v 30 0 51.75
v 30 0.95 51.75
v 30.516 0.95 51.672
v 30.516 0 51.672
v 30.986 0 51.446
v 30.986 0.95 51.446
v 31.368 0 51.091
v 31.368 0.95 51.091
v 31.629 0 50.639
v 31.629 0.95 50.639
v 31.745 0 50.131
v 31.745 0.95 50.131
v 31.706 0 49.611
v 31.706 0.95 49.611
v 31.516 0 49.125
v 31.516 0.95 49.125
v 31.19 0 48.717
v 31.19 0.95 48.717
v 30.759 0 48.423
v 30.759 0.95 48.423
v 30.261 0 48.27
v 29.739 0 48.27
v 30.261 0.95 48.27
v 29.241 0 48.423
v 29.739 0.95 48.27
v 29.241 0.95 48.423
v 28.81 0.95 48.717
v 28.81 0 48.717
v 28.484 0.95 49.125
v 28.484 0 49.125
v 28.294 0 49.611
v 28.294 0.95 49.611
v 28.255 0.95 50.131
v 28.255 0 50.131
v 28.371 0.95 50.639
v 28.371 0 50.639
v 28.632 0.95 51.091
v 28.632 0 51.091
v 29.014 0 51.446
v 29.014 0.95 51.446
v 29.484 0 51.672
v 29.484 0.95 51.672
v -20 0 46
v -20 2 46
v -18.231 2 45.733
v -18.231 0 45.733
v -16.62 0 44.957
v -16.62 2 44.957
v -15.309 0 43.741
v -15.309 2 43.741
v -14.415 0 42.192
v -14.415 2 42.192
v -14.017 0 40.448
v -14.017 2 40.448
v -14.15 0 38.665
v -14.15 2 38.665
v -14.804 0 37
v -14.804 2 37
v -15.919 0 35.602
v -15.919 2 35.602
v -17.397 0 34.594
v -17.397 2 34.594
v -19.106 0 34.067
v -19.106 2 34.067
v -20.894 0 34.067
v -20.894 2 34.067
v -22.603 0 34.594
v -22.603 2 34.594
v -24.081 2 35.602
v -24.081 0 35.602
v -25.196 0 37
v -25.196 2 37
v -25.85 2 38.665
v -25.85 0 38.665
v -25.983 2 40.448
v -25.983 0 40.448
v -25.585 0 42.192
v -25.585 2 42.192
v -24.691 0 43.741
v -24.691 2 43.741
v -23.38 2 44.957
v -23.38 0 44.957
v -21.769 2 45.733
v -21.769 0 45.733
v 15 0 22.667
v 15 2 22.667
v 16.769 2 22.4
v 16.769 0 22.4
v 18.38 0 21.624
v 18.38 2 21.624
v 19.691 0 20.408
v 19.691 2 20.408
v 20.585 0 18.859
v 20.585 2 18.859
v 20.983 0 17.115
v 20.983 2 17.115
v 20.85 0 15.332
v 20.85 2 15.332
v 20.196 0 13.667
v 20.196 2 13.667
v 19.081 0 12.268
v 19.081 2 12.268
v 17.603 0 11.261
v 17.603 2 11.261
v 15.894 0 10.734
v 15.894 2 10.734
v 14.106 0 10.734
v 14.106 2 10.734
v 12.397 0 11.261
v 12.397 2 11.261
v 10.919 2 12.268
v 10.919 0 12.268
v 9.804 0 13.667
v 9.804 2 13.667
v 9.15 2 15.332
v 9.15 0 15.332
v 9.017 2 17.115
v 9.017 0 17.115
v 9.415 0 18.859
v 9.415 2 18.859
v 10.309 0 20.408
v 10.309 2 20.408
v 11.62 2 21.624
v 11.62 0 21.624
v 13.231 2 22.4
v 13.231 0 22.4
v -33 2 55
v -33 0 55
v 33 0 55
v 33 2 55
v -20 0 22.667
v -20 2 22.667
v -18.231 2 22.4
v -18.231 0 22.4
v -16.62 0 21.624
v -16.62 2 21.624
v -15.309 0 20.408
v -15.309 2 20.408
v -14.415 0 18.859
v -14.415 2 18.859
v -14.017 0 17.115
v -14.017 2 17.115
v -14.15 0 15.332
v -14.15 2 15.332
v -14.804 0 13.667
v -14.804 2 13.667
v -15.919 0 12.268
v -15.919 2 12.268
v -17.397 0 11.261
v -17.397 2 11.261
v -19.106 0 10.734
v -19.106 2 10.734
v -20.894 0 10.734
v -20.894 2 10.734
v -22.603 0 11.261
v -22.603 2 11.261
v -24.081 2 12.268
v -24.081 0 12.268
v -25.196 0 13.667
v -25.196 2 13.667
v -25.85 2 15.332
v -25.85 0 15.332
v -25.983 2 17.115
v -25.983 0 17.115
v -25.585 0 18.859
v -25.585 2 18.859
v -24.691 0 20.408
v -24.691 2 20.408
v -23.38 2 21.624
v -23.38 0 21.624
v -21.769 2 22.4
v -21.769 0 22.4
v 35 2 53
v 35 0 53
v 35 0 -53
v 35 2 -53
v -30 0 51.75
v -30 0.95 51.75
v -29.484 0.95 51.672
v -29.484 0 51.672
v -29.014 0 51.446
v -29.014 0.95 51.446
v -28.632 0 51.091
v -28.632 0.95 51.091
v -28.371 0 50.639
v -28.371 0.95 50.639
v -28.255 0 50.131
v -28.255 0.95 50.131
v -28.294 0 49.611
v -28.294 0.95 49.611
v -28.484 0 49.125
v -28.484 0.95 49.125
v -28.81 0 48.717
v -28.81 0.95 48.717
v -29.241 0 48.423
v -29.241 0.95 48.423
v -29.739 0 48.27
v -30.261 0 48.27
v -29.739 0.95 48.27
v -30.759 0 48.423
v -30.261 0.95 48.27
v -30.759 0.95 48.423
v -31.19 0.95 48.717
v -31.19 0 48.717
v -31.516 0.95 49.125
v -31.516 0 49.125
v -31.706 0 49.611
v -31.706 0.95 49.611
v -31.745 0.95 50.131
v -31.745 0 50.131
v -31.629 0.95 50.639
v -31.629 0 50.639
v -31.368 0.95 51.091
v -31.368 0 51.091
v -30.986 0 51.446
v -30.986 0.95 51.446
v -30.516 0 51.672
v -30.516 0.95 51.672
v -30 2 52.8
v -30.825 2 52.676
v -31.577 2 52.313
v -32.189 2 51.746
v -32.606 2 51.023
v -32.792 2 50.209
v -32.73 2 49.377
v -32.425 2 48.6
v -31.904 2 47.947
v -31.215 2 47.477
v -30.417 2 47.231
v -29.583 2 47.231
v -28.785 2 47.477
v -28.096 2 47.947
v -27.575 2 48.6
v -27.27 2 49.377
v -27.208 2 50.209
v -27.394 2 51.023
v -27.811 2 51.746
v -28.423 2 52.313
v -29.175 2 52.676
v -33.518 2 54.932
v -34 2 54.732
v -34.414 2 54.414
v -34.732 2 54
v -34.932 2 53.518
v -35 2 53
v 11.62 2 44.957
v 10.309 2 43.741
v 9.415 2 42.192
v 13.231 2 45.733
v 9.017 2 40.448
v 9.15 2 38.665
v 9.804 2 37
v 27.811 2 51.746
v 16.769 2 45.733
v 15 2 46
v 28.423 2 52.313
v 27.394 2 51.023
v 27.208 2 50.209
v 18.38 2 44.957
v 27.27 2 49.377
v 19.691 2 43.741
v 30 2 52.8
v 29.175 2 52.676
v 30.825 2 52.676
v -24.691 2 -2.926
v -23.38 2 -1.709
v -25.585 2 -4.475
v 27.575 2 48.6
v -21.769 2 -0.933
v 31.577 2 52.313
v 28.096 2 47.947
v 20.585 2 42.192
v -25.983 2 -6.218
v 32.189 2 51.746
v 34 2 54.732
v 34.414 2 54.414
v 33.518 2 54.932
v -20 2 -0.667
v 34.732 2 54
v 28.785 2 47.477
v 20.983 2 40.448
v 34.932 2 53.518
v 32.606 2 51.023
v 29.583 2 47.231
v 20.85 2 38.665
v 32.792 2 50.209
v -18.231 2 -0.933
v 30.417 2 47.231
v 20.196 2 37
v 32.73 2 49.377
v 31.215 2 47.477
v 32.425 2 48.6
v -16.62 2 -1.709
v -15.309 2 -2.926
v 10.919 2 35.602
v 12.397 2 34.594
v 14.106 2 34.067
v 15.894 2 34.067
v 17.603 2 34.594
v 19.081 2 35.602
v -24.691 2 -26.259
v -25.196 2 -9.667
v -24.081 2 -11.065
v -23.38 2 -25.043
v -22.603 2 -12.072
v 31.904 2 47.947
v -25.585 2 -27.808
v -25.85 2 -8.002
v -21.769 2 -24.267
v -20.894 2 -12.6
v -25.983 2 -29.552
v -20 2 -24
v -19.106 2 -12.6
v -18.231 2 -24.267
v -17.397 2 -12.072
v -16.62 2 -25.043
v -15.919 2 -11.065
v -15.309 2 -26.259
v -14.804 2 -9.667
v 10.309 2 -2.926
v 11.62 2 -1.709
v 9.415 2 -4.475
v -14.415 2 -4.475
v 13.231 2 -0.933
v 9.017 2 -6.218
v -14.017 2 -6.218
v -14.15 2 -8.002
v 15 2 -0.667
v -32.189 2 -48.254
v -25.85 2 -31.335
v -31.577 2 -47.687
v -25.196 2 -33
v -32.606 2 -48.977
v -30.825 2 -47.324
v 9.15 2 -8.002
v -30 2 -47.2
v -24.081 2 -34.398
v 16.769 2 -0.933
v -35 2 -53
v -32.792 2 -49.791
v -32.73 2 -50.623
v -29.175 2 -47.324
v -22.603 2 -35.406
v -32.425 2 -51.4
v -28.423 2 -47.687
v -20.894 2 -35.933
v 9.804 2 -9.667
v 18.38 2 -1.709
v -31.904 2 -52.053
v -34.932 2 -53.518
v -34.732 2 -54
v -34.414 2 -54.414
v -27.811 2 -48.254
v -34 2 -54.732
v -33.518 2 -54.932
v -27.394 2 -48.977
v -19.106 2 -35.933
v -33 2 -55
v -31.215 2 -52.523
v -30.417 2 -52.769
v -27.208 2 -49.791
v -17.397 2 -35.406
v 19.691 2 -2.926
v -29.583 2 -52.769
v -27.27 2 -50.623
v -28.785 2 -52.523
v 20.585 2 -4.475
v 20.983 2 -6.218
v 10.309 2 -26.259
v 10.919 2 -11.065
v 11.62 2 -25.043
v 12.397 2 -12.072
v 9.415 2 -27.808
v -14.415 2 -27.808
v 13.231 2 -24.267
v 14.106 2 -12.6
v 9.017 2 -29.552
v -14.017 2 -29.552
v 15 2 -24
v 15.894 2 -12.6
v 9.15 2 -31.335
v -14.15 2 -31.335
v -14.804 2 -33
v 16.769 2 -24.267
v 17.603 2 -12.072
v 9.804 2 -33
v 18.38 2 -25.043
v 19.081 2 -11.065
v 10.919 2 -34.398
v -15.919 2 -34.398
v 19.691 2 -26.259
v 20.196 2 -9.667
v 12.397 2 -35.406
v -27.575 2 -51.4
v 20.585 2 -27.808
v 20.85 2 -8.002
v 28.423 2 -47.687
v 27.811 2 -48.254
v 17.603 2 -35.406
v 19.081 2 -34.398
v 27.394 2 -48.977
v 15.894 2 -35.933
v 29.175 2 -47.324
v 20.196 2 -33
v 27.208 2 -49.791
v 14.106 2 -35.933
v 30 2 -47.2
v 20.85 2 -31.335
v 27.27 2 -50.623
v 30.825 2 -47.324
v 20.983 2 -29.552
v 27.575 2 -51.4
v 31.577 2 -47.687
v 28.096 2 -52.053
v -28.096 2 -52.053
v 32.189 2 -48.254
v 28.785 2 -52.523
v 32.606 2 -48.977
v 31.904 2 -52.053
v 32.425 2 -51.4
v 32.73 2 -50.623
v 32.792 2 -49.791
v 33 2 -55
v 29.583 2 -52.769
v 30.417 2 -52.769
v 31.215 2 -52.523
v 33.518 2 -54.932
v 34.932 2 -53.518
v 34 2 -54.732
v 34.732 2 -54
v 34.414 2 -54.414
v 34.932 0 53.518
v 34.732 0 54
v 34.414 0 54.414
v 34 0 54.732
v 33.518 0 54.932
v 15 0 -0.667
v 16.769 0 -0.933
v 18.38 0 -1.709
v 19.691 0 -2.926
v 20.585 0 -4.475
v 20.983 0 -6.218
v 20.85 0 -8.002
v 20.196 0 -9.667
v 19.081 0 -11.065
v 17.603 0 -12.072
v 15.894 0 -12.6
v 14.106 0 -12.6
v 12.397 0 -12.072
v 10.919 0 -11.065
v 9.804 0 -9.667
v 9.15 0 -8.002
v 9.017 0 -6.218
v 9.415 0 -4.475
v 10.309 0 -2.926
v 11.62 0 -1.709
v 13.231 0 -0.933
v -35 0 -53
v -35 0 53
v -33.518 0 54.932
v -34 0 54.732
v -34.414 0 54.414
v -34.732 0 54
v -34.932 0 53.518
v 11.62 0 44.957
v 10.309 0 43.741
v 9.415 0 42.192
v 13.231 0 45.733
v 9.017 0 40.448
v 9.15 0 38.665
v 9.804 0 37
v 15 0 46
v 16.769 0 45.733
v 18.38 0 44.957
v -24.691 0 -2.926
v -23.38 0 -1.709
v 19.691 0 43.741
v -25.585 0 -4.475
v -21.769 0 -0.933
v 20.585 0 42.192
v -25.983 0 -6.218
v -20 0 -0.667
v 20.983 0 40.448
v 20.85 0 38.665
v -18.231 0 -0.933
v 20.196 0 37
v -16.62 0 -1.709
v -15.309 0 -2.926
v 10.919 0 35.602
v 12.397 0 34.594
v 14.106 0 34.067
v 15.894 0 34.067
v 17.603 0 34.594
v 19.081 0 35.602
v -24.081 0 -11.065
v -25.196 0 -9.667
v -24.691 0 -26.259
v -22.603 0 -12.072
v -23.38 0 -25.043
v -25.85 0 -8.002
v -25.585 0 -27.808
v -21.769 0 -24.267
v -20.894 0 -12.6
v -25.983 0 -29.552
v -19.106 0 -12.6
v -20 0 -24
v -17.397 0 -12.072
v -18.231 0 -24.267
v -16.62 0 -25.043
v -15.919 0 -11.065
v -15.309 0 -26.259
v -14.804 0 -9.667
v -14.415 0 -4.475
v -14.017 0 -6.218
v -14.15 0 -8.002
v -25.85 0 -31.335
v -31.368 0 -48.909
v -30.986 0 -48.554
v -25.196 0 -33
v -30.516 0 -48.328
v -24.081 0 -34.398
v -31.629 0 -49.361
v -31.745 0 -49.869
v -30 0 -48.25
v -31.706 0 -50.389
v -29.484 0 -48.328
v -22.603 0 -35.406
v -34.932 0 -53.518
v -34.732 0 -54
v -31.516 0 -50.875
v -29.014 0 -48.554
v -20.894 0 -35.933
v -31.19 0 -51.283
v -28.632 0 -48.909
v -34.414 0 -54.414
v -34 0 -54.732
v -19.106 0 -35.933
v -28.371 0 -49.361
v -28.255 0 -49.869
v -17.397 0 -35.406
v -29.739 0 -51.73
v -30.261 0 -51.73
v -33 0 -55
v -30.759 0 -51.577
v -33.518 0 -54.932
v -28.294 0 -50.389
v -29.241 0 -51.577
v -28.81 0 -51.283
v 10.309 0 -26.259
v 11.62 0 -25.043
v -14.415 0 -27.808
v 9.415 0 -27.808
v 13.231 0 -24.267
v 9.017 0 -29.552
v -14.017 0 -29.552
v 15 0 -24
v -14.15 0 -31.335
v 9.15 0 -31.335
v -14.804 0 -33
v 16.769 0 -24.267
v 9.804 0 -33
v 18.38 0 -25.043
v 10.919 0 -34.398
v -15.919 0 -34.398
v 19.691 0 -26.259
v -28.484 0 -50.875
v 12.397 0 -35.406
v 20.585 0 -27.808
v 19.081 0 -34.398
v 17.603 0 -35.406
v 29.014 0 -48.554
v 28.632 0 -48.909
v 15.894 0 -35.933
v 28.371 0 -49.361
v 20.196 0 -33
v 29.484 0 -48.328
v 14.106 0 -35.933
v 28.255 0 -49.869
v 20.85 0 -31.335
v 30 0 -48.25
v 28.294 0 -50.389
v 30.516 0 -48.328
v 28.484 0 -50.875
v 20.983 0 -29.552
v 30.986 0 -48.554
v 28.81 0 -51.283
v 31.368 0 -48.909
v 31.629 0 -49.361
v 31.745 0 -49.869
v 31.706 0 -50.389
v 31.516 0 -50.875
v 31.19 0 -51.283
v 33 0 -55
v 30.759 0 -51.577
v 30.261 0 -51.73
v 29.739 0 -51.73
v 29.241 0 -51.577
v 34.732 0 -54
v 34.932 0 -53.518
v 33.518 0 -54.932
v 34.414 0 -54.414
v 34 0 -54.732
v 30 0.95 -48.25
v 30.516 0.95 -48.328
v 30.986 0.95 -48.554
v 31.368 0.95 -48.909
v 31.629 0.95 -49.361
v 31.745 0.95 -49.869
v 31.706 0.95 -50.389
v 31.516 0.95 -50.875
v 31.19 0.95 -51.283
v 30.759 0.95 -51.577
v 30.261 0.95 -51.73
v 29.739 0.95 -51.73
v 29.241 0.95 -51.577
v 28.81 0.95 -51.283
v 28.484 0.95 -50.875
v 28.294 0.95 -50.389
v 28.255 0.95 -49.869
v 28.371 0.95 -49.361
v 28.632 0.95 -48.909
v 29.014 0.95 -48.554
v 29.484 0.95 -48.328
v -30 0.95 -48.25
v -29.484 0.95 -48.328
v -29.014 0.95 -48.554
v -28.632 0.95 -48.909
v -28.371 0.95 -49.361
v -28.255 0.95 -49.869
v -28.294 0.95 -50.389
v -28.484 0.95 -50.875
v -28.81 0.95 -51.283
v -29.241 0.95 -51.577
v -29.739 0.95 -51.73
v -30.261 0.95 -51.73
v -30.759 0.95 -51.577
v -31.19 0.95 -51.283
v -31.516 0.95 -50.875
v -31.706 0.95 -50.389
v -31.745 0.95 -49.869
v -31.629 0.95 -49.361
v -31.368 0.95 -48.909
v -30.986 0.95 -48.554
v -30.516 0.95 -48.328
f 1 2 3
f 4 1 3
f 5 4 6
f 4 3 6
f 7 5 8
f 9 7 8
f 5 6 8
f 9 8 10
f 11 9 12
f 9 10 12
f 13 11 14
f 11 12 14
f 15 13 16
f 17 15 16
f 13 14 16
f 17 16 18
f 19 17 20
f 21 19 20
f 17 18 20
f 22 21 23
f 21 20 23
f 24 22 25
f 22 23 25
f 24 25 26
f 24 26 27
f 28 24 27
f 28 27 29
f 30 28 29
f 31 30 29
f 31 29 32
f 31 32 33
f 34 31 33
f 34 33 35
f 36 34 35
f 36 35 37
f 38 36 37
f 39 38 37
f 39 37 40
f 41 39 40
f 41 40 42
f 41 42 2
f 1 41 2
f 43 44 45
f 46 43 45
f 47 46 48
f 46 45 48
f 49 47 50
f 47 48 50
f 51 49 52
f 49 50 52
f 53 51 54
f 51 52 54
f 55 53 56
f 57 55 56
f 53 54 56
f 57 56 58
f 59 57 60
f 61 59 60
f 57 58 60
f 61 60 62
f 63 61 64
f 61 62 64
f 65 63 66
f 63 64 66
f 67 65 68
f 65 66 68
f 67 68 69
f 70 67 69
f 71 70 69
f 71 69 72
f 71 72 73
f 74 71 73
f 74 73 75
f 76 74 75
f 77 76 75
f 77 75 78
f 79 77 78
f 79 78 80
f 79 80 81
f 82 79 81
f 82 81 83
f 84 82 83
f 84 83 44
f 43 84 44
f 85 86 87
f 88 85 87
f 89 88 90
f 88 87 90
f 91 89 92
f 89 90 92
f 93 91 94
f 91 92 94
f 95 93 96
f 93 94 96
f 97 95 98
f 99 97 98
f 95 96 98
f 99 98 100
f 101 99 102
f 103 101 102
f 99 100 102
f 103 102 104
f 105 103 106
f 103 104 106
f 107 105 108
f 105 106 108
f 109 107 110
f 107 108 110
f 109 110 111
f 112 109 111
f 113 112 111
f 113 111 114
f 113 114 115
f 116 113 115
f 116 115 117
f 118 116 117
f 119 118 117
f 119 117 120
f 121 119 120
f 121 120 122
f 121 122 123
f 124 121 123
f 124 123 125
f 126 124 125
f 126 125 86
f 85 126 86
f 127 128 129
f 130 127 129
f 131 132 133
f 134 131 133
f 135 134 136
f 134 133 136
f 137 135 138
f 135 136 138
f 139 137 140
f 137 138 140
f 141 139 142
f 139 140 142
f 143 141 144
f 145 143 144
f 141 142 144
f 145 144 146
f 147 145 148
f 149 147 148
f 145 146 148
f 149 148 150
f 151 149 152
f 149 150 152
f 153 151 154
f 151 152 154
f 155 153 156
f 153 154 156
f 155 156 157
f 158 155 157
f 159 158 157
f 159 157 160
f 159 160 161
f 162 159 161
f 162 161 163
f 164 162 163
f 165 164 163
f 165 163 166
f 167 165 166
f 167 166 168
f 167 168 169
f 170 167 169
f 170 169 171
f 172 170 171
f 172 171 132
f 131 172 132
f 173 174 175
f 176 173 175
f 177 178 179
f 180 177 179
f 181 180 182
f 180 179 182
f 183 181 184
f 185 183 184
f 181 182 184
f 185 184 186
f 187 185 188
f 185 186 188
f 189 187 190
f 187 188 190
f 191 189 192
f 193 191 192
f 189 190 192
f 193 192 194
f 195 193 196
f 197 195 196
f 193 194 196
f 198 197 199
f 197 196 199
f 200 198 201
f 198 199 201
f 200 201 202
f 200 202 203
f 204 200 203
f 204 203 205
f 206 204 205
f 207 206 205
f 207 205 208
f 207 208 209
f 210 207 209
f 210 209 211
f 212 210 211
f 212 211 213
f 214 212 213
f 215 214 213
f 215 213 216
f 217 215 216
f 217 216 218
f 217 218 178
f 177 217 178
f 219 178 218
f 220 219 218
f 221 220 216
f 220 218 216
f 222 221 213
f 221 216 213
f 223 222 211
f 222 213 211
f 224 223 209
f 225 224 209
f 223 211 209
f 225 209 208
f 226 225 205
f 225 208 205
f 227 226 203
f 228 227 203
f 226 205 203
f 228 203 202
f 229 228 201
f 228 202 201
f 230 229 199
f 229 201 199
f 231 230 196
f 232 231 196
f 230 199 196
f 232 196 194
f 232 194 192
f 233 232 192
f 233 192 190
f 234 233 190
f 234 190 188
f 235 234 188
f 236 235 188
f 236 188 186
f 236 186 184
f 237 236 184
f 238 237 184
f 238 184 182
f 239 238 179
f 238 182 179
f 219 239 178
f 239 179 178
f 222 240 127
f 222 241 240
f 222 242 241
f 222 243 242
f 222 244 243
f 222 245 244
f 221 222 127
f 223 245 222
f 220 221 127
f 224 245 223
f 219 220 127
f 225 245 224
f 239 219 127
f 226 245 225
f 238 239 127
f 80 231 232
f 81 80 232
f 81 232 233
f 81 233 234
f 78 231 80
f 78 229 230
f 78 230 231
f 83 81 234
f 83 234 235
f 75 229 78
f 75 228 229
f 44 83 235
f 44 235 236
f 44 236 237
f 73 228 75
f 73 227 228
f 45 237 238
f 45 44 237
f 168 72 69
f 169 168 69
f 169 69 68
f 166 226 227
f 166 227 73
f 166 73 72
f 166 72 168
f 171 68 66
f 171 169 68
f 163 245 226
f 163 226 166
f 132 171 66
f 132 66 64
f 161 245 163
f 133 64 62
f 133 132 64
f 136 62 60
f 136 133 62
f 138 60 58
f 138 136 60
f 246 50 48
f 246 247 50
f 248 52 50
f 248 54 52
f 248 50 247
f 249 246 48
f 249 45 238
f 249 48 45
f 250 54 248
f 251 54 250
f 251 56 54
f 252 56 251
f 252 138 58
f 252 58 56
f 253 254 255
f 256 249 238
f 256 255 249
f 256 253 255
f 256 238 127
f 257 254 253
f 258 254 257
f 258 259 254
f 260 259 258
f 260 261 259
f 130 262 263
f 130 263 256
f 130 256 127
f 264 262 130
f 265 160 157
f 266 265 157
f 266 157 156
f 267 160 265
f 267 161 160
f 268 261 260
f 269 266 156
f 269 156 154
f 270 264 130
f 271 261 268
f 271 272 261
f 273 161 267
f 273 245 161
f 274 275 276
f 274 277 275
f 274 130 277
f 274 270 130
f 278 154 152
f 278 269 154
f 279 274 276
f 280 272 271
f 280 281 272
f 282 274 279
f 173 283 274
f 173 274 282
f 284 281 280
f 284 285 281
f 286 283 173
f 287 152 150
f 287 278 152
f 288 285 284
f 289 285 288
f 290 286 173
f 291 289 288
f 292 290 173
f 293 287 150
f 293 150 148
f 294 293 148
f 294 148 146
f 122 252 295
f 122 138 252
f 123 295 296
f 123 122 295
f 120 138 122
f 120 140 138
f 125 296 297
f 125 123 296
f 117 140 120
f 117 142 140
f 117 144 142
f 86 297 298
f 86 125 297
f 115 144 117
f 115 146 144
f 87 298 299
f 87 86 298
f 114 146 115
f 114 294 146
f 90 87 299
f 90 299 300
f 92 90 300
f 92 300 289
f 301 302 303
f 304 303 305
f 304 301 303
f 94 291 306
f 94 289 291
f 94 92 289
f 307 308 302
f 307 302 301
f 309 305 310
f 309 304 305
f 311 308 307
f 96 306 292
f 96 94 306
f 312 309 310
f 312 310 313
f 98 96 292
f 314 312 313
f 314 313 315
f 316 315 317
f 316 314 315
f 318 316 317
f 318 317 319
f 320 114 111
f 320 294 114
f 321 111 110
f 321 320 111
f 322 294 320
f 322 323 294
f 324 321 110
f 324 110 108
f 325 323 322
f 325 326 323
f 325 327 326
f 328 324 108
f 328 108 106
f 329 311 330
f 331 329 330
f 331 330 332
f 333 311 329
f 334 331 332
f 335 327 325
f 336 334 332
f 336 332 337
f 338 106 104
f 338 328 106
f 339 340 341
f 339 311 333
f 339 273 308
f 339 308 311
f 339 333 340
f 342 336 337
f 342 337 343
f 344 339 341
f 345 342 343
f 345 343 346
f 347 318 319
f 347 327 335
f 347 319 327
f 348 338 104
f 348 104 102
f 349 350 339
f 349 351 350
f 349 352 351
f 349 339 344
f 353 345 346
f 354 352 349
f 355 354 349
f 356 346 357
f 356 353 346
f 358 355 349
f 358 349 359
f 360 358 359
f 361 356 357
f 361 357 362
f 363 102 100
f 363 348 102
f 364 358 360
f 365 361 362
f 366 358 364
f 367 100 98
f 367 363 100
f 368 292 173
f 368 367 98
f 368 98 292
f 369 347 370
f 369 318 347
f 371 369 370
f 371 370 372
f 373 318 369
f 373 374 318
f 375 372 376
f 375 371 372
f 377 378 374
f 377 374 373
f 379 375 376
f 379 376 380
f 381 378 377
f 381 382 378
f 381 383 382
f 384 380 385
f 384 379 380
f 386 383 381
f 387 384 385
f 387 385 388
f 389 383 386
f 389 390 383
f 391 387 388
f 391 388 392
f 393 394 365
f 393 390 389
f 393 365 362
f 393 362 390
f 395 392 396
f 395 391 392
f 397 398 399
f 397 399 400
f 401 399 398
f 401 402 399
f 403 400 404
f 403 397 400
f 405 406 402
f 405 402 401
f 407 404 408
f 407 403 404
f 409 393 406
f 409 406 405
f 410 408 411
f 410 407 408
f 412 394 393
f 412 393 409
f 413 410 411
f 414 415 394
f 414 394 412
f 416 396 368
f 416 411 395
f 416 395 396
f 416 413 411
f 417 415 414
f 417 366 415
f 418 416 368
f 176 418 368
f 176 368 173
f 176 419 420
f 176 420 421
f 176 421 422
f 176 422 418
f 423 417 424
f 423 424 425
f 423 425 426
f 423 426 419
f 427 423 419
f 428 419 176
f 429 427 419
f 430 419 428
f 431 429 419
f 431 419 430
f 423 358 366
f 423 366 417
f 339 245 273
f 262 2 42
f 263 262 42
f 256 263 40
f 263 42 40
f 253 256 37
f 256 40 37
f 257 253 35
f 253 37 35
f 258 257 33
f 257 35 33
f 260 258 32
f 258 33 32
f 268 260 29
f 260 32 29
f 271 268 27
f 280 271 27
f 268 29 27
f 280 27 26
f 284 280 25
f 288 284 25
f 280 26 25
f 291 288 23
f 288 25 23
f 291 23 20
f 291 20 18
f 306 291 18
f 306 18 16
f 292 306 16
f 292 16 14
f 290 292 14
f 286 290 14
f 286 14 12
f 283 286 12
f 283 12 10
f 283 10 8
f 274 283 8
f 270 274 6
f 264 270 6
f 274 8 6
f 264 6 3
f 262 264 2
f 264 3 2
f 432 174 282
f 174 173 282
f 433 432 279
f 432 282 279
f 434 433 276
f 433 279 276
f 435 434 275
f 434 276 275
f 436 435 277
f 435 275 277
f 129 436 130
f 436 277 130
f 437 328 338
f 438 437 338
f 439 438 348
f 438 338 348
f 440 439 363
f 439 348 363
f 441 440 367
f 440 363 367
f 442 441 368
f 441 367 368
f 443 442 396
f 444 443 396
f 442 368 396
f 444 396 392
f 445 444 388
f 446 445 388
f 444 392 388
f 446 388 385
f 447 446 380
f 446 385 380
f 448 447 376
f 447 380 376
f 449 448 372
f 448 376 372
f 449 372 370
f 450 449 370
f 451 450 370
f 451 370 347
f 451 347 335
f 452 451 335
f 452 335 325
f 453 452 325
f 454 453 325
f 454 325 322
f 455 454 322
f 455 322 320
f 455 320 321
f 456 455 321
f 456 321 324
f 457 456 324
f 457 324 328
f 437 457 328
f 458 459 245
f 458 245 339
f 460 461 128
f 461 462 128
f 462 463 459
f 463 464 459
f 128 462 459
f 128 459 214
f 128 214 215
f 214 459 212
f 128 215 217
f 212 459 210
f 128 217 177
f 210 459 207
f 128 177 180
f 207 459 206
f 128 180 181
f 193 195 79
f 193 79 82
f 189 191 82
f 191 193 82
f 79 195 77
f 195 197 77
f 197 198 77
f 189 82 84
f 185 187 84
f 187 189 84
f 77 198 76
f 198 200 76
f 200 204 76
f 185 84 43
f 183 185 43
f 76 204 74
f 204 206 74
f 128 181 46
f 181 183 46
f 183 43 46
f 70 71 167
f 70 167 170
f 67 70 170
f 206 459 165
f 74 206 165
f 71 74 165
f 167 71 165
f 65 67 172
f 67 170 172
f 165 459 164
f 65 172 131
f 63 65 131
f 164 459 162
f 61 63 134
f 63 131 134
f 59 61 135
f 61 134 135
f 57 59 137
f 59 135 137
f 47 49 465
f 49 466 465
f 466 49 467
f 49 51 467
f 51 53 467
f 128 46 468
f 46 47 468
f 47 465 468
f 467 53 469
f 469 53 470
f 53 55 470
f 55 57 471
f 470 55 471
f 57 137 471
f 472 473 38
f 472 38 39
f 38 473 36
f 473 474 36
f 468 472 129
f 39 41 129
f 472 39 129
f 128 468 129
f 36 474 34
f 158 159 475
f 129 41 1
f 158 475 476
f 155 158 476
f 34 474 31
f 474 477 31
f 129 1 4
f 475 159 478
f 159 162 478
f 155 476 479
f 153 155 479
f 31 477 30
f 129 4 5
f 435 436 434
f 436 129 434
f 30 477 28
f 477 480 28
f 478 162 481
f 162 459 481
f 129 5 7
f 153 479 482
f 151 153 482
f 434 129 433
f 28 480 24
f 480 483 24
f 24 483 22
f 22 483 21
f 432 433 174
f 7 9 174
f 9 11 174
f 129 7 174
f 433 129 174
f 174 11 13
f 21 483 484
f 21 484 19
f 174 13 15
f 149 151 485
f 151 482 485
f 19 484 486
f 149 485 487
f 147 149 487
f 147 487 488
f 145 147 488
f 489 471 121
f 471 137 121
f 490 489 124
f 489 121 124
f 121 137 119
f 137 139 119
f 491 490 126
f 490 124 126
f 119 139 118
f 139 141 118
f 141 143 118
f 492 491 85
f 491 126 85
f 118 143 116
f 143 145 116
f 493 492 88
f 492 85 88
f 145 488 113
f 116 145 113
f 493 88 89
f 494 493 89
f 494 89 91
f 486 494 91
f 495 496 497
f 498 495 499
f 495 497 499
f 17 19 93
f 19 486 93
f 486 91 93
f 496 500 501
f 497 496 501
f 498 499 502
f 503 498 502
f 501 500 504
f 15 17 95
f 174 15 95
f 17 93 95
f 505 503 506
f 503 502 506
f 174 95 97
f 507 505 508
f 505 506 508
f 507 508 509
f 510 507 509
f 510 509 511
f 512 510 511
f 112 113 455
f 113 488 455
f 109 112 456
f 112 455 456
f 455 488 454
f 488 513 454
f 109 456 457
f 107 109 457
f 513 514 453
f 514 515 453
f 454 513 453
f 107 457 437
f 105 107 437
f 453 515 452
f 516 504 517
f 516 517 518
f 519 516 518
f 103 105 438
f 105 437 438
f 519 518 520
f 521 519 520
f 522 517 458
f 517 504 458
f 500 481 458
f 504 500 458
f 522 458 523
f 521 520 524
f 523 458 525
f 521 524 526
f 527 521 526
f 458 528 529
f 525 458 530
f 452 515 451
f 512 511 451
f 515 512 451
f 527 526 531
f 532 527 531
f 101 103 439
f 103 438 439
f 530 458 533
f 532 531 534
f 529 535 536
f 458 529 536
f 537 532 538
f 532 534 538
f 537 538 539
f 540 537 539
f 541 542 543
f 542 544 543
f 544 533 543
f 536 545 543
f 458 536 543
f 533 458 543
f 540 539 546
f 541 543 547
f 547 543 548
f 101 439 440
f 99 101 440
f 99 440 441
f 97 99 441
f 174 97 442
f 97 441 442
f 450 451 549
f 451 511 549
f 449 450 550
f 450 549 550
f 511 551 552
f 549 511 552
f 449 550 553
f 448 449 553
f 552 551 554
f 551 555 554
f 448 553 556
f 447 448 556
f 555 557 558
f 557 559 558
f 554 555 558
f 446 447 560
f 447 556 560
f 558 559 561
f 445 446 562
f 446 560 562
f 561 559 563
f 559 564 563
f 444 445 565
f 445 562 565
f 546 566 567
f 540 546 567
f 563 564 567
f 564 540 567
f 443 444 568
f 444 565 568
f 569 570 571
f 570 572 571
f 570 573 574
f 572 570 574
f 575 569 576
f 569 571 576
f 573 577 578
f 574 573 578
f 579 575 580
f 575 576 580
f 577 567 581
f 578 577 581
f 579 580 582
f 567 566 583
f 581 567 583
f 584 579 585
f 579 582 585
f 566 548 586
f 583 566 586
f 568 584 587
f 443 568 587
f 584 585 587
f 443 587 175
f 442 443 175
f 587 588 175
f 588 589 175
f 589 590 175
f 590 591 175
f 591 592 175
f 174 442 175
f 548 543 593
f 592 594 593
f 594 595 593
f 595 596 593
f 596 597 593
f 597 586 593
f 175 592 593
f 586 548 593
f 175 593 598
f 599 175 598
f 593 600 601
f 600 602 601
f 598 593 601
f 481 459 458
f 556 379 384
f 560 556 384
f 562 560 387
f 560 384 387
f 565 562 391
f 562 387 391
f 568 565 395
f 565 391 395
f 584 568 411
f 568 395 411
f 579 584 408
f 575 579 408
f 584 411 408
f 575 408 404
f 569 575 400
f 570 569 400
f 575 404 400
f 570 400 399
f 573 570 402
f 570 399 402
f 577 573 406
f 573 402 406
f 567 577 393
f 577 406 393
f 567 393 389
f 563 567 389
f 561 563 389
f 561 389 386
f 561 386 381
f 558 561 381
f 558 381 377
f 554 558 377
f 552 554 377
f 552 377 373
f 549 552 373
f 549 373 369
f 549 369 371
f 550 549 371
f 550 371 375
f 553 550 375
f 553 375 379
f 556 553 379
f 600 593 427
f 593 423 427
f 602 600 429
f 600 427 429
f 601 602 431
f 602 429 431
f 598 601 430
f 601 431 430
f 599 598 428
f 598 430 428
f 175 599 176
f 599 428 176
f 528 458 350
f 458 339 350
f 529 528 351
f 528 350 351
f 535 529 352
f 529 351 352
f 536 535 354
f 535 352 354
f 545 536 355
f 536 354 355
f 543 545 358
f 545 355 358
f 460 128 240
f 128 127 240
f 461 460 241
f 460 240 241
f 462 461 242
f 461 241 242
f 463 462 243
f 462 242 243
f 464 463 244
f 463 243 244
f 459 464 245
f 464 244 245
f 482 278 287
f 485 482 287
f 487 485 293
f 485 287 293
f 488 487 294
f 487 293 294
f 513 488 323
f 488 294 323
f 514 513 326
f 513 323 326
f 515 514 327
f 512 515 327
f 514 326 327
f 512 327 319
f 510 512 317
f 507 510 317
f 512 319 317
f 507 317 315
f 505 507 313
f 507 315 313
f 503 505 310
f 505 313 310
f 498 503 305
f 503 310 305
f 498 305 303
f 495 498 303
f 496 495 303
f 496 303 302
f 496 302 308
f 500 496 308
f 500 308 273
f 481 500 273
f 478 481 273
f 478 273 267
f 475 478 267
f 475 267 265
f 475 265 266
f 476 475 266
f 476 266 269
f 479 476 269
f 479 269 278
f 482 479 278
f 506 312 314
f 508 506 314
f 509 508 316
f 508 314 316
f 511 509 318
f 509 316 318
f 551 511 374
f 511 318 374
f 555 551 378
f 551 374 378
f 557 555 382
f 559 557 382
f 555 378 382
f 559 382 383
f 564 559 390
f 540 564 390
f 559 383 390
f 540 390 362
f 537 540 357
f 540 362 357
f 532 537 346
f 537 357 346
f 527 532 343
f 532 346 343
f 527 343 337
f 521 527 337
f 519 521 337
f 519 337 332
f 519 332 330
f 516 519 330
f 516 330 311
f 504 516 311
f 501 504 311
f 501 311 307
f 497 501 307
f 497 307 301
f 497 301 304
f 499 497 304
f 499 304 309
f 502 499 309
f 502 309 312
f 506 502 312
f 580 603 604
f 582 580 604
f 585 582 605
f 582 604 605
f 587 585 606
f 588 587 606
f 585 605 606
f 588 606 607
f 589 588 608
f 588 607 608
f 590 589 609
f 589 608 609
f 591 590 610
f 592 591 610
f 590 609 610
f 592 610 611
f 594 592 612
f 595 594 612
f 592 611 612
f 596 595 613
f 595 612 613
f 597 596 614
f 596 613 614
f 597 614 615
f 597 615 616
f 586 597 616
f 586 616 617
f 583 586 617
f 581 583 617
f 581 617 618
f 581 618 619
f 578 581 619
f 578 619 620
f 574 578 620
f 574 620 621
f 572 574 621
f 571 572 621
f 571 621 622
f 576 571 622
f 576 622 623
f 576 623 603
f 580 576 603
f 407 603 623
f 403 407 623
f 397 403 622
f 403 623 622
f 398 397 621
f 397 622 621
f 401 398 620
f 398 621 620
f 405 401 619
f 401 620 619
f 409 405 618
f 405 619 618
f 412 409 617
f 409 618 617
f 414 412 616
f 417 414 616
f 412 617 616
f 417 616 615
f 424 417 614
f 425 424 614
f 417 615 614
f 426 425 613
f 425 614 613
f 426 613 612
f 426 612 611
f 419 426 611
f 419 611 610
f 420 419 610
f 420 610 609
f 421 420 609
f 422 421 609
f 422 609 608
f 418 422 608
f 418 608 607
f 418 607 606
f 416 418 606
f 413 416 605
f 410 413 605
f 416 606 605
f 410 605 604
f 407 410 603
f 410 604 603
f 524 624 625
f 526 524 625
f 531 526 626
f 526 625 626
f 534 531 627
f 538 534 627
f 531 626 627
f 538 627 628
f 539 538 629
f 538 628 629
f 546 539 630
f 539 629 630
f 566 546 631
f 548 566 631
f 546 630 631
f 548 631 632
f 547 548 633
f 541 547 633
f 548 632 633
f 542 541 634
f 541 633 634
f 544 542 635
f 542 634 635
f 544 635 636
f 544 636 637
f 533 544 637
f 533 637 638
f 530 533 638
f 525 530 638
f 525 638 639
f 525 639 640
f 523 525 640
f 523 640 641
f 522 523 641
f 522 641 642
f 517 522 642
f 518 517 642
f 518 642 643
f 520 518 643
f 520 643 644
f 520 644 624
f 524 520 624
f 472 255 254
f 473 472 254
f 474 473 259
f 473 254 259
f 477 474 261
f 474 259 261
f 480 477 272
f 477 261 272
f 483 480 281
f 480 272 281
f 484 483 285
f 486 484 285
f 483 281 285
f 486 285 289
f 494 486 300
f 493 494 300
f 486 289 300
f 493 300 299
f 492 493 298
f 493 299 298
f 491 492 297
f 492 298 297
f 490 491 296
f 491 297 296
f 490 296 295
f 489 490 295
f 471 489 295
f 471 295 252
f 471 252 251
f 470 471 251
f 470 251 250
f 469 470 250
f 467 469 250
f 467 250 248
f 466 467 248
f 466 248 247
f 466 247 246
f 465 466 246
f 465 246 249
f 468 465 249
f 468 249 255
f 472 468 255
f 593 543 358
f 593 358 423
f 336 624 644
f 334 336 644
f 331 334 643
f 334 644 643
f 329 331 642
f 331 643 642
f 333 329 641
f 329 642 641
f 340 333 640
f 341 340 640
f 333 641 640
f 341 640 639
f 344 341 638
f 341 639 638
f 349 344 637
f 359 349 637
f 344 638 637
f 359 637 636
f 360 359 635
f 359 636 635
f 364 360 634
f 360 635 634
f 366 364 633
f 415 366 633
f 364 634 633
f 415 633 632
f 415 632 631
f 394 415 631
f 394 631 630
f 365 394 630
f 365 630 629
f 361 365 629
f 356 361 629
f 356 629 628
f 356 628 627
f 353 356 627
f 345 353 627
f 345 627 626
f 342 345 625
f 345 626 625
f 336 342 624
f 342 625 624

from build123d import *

# Parameters (mm, degrees)
FACE_PLATE_W           = 70
FACE_PLATE_H           = 110
FACE_PLATE_EXT_DEPTH   = 2
BUTTONS_R              = 6
BUTTONS_CUT_DEPTH      = 10
M3_TOP_SCREW_R         = 1.75
M3_TOP_SCREW_CUT_DEPTH = 10
FILLET1_R              = 2
FILLET2_R              = 2
FILLET3_R              = 2
FILLET4_R              = 2


with BuildPart() as part:
    # Face Plate → Face Plate Ext (new body)
    with BuildSketch(Plane(origin=(0, 0, 0), x_dir=(1, 0, 0), z_dir=(0, 1, 0))):
        Rectangle(FACE_PLATE_W, FACE_PLATE_H)
    extrude(amount=FACE_PLATE_EXT_DEPTH)

    # Buttons → Buttons CUT (cut)
    with BuildSketch(Plane(origin=(0, 2, 0), x_dir=(1, 0, 0), z_dir=(0, 1, 0))):
        with Locations(Location((-20, 30, 0), (0, 0, 270))):
            Circle(BUTTONS_R)
        with Locations(Location((15, 30, 0), (0, 0, 270))):
            Circle(BUTTONS_R)
        with Locations(Location((-20, 6.666666667, 0), (0, 0, 270))):
            Circle(BUTTONS_R)
        with Locations(Location((15, 6.666666667, 0), (0, 0, 270))):
            Circle(BUTTONS_R)
        with Locations(Location((-20, -16.666666667, 0), (0, 0, 270))):
            Circle(BUTTONS_R)
        with Locations(Location((-20, -40, 0), (0, 0, 270))):
            Circle(BUTTONS_R)
        with Locations(Location((15, -16.666666667, 0), (0, 0, 270))):
            Circle(BUTTONS_R)
        with Locations(Location((15, -40, 0), (0, 0, 270))):
            Circle(BUTTONS_R)
    extrude(amount=-BUTTONS_CUT_DEPTH, mode=Mode.SUBTRACT)

    # M3 Top Screw → M3 Top Screw CUT (cut)
    with BuildSketch(Plane(origin=(0, 2, 0), x_dir=(1, 0, 0), z_dir=(0, 1, 0))):
        with Locations(Location((-30, 50, 0), (0, 0, 270))):
            Circle(M3_TOP_SCREW_R)
        with Locations(Location((30, 50, 0), (0, 0, 270))):
            Circle(M3_TOP_SCREW_R)
        with Locations(Location((-30, -50, 0), (0, 0, 270))):
            Circle(M3_TOP_SCREW_R)
        with Locations(Location((30, -50, 0), (0, 0, 270))):
            Circle(M3_TOP_SCREW_R)
    extrude(amount=-M3_TOP_SCREW_CUT_DEPTH, mode=Mode.SUBTRACT)

    # M3 Head Top CUT cone 1 section (through the dimple's axis) → M3 Head Top CUT (revolve, cut)
    with BuildSketch(Plane(origin=(-30, 2, -50), x_dir=(0, 0, 1), z_dir=(1, 0, 0))):
        Polygon((0, 0), (2.8, 0), (0, 2.8), align=None)
    revolve(axis=Axis((-30, 2, -50), (0, -1, 0)), mode=Mode.SUBTRACT)

    # M3 Head Top CUT cone 2 section (through the dimple's axis) → M3 Head Top CUT cone 2 (revolve, cut)
    with BuildSketch(Plane(origin=(30, 2, -50), x_dir=(0, 0, 1), z_dir=(1, 0, 0))):
        Polygon((0, 0), (2.8, 0), (0, 2.8), align=None)
    revolve(axis=Axis((30, 2, -50), (0, -1, 0)), mode=Mode.SUBTRACT)

    # M3 Head Top CUT cone 3 section (through the dimple's axis) → M3 Head Top CUT cone 3 (revolve, cut)
    with BuildSketch(Plane(origin=(30, 2, 50), x_dir=(0, 0, 1), z_dir=(1, 0, 0))):
        Polygon((0, 0), (2.8, 0), (0, 2.8), align=None)
    revolve(axis=Axis((30, 2, 50), (0, -1, 0)), mode=Mode.SUBTRACT)

    # M3 Head Top CUT cone 4 section (through the dimple's axis) → M3 Head Top CUT cone 4 (revolve, cut)
    with BuildSketch(Plane(origin=(-30, 2, 50), x_dir=(0, 0, 1), z_dir=(1, 0, 0))):
        Polygon((0, 0), (2.8, 0), (0, 2.8), align=None)
    revolve(axis=Axis((-30, 2, 50), (0, -1, 0)), mode=Mode.SUBTRACT)

    # Fillet1
    fillet1_edges = [part.edges().sort_by_distance(p)[0] for p in [
        (-35, 1, -55),
    ]]
    fillet(fillet1_edges, radius=FILLET1_R)

    # Fillet2
    fillet2_edges = [part.edges().sort_by_distance(p)[0] for p in [
        (35, 1, -55),
    ]]
    fillet(fillet2_edges, radius=FILLET2_R)

    # Fillet3
    fillet3_edges = [part.edges().sort_by_distance(p)[0] for p in [
        (35, 1, 55),
    ]]
    fillet(fillet3_edges, radius=FILLET3_R)

    # Fillet4
    fillet4_edges = [part.edges().sort_by_distance(p)[0] for p in [
        (-35, 1, 55),
    ]]
    fillet(fillet4_edges, radius=FILLET4_R)


solid = part.part
